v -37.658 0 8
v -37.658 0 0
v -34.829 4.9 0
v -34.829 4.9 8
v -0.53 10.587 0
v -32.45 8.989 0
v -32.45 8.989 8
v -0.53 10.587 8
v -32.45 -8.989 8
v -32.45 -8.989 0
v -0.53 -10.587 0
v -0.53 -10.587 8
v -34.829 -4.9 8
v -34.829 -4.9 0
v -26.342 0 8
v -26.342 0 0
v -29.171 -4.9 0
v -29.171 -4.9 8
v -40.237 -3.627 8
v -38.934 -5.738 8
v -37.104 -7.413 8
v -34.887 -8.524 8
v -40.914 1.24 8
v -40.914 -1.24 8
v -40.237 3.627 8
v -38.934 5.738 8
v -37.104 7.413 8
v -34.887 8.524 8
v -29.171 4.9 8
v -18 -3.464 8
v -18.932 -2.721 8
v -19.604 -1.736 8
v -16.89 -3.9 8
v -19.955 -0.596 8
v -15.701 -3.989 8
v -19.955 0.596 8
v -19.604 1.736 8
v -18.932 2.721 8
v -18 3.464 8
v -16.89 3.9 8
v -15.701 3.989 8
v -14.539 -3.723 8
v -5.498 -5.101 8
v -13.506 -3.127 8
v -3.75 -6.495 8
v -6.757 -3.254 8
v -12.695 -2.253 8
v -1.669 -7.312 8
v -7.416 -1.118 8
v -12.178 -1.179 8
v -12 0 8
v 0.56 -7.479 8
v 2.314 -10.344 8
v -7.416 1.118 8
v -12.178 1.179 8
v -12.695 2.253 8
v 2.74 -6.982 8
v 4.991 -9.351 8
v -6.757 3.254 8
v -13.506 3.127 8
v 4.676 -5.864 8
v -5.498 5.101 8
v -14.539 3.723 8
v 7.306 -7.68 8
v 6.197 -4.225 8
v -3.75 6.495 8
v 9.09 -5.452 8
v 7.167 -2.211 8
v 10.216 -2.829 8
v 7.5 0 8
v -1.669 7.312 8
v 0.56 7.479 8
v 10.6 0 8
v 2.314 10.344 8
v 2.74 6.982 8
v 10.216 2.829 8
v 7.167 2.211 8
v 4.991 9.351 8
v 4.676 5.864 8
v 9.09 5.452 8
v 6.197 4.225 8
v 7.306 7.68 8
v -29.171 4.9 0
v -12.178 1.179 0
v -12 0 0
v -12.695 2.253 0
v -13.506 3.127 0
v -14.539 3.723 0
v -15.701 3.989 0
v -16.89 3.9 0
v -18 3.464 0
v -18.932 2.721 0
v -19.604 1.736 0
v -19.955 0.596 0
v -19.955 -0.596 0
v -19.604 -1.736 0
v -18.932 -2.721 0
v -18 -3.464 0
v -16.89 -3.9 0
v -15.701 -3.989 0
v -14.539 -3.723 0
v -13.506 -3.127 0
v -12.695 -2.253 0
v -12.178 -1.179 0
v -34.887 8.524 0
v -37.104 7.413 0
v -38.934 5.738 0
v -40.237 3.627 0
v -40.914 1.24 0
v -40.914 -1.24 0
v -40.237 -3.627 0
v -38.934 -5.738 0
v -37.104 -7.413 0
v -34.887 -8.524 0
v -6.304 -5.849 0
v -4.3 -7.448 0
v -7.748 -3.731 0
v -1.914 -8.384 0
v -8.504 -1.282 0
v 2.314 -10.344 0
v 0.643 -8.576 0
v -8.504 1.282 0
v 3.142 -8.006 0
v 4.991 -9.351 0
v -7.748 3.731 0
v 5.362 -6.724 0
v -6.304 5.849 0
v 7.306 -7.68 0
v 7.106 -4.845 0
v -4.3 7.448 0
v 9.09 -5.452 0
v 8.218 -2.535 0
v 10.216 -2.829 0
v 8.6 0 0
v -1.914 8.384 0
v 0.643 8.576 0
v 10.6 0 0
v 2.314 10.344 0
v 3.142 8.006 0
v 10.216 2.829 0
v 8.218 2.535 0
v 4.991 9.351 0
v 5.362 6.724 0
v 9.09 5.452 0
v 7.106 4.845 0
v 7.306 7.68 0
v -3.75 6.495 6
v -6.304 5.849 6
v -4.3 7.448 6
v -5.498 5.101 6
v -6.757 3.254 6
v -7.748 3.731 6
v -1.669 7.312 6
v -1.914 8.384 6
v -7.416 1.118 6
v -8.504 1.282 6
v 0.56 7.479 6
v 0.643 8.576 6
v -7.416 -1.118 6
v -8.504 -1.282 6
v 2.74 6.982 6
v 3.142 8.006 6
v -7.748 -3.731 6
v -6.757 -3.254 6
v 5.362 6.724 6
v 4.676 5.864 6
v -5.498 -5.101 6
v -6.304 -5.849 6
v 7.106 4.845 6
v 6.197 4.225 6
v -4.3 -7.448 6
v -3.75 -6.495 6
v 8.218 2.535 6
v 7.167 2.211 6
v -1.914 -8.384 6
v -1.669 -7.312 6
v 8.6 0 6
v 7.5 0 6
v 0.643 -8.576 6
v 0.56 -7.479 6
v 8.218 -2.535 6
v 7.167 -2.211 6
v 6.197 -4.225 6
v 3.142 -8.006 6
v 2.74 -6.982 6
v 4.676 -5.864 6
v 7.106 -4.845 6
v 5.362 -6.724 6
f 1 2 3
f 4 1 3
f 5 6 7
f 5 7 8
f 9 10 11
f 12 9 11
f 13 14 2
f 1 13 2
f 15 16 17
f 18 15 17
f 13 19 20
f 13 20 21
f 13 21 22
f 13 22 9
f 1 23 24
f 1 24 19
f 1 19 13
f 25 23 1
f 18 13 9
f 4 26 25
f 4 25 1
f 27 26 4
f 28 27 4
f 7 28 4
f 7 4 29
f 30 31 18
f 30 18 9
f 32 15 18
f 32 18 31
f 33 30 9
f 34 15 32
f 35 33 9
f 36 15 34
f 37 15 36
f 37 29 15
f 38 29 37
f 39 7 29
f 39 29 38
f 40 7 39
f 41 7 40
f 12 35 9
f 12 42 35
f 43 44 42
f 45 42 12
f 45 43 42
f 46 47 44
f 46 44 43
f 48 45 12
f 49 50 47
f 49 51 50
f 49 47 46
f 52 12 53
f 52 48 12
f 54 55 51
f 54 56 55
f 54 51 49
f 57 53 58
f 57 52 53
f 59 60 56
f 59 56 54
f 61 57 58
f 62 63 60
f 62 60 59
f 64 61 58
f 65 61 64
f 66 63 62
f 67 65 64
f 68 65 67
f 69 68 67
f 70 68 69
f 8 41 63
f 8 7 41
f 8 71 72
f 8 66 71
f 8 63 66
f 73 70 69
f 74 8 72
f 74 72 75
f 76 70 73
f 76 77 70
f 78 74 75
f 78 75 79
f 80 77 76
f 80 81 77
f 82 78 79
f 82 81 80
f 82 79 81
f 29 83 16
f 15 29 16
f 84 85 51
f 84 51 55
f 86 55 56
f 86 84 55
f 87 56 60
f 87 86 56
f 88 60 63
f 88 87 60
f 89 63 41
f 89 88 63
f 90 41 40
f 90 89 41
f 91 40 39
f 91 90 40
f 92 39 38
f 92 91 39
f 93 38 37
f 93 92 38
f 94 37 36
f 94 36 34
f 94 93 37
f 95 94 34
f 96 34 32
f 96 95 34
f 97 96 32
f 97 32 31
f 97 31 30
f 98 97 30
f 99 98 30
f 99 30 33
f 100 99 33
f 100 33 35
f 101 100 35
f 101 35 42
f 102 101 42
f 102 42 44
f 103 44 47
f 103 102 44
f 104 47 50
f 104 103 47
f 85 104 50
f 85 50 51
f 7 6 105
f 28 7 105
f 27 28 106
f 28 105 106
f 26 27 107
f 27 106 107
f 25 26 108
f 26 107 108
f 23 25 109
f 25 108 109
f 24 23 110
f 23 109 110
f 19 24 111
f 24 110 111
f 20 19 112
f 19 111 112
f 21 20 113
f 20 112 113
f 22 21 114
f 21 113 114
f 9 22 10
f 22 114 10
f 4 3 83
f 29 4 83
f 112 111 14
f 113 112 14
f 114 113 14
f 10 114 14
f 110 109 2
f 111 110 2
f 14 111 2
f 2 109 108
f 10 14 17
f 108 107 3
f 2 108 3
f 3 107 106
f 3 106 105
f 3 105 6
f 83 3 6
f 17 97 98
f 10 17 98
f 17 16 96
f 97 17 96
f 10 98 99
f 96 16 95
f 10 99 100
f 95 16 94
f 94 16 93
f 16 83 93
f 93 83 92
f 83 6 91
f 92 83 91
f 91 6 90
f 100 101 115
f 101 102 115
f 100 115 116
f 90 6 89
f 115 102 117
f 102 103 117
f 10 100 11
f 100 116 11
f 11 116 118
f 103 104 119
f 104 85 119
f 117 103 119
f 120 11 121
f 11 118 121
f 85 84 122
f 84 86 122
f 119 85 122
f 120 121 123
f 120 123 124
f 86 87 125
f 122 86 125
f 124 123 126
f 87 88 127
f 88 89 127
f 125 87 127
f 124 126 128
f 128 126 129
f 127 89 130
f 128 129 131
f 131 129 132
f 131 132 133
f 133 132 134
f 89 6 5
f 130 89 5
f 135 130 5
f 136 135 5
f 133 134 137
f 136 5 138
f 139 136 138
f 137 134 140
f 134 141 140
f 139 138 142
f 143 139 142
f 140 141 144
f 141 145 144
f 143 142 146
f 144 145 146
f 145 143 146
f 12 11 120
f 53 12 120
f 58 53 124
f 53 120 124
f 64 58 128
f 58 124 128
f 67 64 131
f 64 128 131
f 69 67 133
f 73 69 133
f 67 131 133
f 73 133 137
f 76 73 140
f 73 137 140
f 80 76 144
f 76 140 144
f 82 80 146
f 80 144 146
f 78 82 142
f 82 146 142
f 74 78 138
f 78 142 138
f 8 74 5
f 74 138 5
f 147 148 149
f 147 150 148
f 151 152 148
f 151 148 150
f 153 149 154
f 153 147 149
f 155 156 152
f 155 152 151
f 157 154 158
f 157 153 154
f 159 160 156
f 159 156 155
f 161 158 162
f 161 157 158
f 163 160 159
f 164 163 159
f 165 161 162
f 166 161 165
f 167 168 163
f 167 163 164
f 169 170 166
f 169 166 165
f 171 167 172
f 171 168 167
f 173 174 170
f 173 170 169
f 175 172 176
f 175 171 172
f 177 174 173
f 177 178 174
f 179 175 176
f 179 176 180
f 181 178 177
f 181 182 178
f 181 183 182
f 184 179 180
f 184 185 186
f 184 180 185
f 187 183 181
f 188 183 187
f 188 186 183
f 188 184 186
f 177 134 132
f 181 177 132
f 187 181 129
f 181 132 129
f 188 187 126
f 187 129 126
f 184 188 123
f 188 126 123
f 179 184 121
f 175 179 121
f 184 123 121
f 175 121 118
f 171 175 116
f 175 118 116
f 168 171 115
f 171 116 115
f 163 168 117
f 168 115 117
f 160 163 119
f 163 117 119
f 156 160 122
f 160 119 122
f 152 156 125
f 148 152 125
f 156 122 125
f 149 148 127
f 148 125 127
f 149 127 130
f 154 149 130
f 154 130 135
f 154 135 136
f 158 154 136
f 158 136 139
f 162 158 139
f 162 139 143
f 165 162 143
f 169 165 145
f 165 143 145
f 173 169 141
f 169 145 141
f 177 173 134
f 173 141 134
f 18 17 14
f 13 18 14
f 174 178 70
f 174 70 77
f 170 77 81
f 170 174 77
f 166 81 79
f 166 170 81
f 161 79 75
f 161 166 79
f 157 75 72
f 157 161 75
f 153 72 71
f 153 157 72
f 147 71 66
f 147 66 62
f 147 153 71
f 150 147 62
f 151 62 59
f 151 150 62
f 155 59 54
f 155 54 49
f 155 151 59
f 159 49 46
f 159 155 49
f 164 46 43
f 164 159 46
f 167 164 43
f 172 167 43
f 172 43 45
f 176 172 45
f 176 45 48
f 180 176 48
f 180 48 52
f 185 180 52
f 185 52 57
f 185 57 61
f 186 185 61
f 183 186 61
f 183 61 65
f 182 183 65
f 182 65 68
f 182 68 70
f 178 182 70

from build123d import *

# Parameters (mm, degrees)
SKETCH_R        = 3.2
SKETCH_R_2      = 7.5
SKETCH_R_3      = 4
PAD_DEPTH       = 8
SKETCH001_R     = 8.6
POCKET_DEPTH    = 6
POCKET001_DEPTH = 8.001


with BuildPart() as part:
    # Sketch → Pad (new body)
    with BuildSketch(Plane.XY):
        with BuildLine():
            ThreePointArc((-32.45, 8.988743), (-41, 0), (-32.45, -8.988743))
            Line((-32.45, -8.988743), (-0.53, -10.586742))
            ThreePointArc((-0.53, -10.586742), (10.6, 0), (-0.53, 10.586742))
            Line((-32.45, 8.988743), (-0.53, 10.586742))
        make_face()
        with Locations((-32, 0)):
            Circle(SKETCH_R, mode=Mode.SUBTRACT)
        Circle(SKETCH_R_2, mode=Mode.SUBTRACT)
        with Locations((-16, 0)):
            Circle(SKETCH_R_3, mode=Mode.SUBTRACT)
    extrude(amount=PAD_DEPTH)

    # Sketch001 → Pocket (cut)
    with BuildSketch(Plane(origin=(0, 0, 0), x_dir=(1, 0, 0), z_dir=(0, 0, -1))):
        Circle(SKETCH001_R)
    extrude(amount=-POCKET_DEPTH, mode=Mode.SUBTRACT)

    # Sketch002 → Pocket001 (cut, through all)
    with BuildSketch(Plane(origin=(0, 0, 0), x_dir=(1, 0, 0), z_dir=(0, 0, -1))):
        Polygon((-34.829016, 4.9), (-37.658033, 0), (-34.829016, -4.9), (-29.170984, -4.9), (-26.341967, 0), (-29.170984, 4.9), align=None)
    extrude(amount=-POCKET001_DEPTH, mode=Mode.SUBTRACT)


solid = part.part
